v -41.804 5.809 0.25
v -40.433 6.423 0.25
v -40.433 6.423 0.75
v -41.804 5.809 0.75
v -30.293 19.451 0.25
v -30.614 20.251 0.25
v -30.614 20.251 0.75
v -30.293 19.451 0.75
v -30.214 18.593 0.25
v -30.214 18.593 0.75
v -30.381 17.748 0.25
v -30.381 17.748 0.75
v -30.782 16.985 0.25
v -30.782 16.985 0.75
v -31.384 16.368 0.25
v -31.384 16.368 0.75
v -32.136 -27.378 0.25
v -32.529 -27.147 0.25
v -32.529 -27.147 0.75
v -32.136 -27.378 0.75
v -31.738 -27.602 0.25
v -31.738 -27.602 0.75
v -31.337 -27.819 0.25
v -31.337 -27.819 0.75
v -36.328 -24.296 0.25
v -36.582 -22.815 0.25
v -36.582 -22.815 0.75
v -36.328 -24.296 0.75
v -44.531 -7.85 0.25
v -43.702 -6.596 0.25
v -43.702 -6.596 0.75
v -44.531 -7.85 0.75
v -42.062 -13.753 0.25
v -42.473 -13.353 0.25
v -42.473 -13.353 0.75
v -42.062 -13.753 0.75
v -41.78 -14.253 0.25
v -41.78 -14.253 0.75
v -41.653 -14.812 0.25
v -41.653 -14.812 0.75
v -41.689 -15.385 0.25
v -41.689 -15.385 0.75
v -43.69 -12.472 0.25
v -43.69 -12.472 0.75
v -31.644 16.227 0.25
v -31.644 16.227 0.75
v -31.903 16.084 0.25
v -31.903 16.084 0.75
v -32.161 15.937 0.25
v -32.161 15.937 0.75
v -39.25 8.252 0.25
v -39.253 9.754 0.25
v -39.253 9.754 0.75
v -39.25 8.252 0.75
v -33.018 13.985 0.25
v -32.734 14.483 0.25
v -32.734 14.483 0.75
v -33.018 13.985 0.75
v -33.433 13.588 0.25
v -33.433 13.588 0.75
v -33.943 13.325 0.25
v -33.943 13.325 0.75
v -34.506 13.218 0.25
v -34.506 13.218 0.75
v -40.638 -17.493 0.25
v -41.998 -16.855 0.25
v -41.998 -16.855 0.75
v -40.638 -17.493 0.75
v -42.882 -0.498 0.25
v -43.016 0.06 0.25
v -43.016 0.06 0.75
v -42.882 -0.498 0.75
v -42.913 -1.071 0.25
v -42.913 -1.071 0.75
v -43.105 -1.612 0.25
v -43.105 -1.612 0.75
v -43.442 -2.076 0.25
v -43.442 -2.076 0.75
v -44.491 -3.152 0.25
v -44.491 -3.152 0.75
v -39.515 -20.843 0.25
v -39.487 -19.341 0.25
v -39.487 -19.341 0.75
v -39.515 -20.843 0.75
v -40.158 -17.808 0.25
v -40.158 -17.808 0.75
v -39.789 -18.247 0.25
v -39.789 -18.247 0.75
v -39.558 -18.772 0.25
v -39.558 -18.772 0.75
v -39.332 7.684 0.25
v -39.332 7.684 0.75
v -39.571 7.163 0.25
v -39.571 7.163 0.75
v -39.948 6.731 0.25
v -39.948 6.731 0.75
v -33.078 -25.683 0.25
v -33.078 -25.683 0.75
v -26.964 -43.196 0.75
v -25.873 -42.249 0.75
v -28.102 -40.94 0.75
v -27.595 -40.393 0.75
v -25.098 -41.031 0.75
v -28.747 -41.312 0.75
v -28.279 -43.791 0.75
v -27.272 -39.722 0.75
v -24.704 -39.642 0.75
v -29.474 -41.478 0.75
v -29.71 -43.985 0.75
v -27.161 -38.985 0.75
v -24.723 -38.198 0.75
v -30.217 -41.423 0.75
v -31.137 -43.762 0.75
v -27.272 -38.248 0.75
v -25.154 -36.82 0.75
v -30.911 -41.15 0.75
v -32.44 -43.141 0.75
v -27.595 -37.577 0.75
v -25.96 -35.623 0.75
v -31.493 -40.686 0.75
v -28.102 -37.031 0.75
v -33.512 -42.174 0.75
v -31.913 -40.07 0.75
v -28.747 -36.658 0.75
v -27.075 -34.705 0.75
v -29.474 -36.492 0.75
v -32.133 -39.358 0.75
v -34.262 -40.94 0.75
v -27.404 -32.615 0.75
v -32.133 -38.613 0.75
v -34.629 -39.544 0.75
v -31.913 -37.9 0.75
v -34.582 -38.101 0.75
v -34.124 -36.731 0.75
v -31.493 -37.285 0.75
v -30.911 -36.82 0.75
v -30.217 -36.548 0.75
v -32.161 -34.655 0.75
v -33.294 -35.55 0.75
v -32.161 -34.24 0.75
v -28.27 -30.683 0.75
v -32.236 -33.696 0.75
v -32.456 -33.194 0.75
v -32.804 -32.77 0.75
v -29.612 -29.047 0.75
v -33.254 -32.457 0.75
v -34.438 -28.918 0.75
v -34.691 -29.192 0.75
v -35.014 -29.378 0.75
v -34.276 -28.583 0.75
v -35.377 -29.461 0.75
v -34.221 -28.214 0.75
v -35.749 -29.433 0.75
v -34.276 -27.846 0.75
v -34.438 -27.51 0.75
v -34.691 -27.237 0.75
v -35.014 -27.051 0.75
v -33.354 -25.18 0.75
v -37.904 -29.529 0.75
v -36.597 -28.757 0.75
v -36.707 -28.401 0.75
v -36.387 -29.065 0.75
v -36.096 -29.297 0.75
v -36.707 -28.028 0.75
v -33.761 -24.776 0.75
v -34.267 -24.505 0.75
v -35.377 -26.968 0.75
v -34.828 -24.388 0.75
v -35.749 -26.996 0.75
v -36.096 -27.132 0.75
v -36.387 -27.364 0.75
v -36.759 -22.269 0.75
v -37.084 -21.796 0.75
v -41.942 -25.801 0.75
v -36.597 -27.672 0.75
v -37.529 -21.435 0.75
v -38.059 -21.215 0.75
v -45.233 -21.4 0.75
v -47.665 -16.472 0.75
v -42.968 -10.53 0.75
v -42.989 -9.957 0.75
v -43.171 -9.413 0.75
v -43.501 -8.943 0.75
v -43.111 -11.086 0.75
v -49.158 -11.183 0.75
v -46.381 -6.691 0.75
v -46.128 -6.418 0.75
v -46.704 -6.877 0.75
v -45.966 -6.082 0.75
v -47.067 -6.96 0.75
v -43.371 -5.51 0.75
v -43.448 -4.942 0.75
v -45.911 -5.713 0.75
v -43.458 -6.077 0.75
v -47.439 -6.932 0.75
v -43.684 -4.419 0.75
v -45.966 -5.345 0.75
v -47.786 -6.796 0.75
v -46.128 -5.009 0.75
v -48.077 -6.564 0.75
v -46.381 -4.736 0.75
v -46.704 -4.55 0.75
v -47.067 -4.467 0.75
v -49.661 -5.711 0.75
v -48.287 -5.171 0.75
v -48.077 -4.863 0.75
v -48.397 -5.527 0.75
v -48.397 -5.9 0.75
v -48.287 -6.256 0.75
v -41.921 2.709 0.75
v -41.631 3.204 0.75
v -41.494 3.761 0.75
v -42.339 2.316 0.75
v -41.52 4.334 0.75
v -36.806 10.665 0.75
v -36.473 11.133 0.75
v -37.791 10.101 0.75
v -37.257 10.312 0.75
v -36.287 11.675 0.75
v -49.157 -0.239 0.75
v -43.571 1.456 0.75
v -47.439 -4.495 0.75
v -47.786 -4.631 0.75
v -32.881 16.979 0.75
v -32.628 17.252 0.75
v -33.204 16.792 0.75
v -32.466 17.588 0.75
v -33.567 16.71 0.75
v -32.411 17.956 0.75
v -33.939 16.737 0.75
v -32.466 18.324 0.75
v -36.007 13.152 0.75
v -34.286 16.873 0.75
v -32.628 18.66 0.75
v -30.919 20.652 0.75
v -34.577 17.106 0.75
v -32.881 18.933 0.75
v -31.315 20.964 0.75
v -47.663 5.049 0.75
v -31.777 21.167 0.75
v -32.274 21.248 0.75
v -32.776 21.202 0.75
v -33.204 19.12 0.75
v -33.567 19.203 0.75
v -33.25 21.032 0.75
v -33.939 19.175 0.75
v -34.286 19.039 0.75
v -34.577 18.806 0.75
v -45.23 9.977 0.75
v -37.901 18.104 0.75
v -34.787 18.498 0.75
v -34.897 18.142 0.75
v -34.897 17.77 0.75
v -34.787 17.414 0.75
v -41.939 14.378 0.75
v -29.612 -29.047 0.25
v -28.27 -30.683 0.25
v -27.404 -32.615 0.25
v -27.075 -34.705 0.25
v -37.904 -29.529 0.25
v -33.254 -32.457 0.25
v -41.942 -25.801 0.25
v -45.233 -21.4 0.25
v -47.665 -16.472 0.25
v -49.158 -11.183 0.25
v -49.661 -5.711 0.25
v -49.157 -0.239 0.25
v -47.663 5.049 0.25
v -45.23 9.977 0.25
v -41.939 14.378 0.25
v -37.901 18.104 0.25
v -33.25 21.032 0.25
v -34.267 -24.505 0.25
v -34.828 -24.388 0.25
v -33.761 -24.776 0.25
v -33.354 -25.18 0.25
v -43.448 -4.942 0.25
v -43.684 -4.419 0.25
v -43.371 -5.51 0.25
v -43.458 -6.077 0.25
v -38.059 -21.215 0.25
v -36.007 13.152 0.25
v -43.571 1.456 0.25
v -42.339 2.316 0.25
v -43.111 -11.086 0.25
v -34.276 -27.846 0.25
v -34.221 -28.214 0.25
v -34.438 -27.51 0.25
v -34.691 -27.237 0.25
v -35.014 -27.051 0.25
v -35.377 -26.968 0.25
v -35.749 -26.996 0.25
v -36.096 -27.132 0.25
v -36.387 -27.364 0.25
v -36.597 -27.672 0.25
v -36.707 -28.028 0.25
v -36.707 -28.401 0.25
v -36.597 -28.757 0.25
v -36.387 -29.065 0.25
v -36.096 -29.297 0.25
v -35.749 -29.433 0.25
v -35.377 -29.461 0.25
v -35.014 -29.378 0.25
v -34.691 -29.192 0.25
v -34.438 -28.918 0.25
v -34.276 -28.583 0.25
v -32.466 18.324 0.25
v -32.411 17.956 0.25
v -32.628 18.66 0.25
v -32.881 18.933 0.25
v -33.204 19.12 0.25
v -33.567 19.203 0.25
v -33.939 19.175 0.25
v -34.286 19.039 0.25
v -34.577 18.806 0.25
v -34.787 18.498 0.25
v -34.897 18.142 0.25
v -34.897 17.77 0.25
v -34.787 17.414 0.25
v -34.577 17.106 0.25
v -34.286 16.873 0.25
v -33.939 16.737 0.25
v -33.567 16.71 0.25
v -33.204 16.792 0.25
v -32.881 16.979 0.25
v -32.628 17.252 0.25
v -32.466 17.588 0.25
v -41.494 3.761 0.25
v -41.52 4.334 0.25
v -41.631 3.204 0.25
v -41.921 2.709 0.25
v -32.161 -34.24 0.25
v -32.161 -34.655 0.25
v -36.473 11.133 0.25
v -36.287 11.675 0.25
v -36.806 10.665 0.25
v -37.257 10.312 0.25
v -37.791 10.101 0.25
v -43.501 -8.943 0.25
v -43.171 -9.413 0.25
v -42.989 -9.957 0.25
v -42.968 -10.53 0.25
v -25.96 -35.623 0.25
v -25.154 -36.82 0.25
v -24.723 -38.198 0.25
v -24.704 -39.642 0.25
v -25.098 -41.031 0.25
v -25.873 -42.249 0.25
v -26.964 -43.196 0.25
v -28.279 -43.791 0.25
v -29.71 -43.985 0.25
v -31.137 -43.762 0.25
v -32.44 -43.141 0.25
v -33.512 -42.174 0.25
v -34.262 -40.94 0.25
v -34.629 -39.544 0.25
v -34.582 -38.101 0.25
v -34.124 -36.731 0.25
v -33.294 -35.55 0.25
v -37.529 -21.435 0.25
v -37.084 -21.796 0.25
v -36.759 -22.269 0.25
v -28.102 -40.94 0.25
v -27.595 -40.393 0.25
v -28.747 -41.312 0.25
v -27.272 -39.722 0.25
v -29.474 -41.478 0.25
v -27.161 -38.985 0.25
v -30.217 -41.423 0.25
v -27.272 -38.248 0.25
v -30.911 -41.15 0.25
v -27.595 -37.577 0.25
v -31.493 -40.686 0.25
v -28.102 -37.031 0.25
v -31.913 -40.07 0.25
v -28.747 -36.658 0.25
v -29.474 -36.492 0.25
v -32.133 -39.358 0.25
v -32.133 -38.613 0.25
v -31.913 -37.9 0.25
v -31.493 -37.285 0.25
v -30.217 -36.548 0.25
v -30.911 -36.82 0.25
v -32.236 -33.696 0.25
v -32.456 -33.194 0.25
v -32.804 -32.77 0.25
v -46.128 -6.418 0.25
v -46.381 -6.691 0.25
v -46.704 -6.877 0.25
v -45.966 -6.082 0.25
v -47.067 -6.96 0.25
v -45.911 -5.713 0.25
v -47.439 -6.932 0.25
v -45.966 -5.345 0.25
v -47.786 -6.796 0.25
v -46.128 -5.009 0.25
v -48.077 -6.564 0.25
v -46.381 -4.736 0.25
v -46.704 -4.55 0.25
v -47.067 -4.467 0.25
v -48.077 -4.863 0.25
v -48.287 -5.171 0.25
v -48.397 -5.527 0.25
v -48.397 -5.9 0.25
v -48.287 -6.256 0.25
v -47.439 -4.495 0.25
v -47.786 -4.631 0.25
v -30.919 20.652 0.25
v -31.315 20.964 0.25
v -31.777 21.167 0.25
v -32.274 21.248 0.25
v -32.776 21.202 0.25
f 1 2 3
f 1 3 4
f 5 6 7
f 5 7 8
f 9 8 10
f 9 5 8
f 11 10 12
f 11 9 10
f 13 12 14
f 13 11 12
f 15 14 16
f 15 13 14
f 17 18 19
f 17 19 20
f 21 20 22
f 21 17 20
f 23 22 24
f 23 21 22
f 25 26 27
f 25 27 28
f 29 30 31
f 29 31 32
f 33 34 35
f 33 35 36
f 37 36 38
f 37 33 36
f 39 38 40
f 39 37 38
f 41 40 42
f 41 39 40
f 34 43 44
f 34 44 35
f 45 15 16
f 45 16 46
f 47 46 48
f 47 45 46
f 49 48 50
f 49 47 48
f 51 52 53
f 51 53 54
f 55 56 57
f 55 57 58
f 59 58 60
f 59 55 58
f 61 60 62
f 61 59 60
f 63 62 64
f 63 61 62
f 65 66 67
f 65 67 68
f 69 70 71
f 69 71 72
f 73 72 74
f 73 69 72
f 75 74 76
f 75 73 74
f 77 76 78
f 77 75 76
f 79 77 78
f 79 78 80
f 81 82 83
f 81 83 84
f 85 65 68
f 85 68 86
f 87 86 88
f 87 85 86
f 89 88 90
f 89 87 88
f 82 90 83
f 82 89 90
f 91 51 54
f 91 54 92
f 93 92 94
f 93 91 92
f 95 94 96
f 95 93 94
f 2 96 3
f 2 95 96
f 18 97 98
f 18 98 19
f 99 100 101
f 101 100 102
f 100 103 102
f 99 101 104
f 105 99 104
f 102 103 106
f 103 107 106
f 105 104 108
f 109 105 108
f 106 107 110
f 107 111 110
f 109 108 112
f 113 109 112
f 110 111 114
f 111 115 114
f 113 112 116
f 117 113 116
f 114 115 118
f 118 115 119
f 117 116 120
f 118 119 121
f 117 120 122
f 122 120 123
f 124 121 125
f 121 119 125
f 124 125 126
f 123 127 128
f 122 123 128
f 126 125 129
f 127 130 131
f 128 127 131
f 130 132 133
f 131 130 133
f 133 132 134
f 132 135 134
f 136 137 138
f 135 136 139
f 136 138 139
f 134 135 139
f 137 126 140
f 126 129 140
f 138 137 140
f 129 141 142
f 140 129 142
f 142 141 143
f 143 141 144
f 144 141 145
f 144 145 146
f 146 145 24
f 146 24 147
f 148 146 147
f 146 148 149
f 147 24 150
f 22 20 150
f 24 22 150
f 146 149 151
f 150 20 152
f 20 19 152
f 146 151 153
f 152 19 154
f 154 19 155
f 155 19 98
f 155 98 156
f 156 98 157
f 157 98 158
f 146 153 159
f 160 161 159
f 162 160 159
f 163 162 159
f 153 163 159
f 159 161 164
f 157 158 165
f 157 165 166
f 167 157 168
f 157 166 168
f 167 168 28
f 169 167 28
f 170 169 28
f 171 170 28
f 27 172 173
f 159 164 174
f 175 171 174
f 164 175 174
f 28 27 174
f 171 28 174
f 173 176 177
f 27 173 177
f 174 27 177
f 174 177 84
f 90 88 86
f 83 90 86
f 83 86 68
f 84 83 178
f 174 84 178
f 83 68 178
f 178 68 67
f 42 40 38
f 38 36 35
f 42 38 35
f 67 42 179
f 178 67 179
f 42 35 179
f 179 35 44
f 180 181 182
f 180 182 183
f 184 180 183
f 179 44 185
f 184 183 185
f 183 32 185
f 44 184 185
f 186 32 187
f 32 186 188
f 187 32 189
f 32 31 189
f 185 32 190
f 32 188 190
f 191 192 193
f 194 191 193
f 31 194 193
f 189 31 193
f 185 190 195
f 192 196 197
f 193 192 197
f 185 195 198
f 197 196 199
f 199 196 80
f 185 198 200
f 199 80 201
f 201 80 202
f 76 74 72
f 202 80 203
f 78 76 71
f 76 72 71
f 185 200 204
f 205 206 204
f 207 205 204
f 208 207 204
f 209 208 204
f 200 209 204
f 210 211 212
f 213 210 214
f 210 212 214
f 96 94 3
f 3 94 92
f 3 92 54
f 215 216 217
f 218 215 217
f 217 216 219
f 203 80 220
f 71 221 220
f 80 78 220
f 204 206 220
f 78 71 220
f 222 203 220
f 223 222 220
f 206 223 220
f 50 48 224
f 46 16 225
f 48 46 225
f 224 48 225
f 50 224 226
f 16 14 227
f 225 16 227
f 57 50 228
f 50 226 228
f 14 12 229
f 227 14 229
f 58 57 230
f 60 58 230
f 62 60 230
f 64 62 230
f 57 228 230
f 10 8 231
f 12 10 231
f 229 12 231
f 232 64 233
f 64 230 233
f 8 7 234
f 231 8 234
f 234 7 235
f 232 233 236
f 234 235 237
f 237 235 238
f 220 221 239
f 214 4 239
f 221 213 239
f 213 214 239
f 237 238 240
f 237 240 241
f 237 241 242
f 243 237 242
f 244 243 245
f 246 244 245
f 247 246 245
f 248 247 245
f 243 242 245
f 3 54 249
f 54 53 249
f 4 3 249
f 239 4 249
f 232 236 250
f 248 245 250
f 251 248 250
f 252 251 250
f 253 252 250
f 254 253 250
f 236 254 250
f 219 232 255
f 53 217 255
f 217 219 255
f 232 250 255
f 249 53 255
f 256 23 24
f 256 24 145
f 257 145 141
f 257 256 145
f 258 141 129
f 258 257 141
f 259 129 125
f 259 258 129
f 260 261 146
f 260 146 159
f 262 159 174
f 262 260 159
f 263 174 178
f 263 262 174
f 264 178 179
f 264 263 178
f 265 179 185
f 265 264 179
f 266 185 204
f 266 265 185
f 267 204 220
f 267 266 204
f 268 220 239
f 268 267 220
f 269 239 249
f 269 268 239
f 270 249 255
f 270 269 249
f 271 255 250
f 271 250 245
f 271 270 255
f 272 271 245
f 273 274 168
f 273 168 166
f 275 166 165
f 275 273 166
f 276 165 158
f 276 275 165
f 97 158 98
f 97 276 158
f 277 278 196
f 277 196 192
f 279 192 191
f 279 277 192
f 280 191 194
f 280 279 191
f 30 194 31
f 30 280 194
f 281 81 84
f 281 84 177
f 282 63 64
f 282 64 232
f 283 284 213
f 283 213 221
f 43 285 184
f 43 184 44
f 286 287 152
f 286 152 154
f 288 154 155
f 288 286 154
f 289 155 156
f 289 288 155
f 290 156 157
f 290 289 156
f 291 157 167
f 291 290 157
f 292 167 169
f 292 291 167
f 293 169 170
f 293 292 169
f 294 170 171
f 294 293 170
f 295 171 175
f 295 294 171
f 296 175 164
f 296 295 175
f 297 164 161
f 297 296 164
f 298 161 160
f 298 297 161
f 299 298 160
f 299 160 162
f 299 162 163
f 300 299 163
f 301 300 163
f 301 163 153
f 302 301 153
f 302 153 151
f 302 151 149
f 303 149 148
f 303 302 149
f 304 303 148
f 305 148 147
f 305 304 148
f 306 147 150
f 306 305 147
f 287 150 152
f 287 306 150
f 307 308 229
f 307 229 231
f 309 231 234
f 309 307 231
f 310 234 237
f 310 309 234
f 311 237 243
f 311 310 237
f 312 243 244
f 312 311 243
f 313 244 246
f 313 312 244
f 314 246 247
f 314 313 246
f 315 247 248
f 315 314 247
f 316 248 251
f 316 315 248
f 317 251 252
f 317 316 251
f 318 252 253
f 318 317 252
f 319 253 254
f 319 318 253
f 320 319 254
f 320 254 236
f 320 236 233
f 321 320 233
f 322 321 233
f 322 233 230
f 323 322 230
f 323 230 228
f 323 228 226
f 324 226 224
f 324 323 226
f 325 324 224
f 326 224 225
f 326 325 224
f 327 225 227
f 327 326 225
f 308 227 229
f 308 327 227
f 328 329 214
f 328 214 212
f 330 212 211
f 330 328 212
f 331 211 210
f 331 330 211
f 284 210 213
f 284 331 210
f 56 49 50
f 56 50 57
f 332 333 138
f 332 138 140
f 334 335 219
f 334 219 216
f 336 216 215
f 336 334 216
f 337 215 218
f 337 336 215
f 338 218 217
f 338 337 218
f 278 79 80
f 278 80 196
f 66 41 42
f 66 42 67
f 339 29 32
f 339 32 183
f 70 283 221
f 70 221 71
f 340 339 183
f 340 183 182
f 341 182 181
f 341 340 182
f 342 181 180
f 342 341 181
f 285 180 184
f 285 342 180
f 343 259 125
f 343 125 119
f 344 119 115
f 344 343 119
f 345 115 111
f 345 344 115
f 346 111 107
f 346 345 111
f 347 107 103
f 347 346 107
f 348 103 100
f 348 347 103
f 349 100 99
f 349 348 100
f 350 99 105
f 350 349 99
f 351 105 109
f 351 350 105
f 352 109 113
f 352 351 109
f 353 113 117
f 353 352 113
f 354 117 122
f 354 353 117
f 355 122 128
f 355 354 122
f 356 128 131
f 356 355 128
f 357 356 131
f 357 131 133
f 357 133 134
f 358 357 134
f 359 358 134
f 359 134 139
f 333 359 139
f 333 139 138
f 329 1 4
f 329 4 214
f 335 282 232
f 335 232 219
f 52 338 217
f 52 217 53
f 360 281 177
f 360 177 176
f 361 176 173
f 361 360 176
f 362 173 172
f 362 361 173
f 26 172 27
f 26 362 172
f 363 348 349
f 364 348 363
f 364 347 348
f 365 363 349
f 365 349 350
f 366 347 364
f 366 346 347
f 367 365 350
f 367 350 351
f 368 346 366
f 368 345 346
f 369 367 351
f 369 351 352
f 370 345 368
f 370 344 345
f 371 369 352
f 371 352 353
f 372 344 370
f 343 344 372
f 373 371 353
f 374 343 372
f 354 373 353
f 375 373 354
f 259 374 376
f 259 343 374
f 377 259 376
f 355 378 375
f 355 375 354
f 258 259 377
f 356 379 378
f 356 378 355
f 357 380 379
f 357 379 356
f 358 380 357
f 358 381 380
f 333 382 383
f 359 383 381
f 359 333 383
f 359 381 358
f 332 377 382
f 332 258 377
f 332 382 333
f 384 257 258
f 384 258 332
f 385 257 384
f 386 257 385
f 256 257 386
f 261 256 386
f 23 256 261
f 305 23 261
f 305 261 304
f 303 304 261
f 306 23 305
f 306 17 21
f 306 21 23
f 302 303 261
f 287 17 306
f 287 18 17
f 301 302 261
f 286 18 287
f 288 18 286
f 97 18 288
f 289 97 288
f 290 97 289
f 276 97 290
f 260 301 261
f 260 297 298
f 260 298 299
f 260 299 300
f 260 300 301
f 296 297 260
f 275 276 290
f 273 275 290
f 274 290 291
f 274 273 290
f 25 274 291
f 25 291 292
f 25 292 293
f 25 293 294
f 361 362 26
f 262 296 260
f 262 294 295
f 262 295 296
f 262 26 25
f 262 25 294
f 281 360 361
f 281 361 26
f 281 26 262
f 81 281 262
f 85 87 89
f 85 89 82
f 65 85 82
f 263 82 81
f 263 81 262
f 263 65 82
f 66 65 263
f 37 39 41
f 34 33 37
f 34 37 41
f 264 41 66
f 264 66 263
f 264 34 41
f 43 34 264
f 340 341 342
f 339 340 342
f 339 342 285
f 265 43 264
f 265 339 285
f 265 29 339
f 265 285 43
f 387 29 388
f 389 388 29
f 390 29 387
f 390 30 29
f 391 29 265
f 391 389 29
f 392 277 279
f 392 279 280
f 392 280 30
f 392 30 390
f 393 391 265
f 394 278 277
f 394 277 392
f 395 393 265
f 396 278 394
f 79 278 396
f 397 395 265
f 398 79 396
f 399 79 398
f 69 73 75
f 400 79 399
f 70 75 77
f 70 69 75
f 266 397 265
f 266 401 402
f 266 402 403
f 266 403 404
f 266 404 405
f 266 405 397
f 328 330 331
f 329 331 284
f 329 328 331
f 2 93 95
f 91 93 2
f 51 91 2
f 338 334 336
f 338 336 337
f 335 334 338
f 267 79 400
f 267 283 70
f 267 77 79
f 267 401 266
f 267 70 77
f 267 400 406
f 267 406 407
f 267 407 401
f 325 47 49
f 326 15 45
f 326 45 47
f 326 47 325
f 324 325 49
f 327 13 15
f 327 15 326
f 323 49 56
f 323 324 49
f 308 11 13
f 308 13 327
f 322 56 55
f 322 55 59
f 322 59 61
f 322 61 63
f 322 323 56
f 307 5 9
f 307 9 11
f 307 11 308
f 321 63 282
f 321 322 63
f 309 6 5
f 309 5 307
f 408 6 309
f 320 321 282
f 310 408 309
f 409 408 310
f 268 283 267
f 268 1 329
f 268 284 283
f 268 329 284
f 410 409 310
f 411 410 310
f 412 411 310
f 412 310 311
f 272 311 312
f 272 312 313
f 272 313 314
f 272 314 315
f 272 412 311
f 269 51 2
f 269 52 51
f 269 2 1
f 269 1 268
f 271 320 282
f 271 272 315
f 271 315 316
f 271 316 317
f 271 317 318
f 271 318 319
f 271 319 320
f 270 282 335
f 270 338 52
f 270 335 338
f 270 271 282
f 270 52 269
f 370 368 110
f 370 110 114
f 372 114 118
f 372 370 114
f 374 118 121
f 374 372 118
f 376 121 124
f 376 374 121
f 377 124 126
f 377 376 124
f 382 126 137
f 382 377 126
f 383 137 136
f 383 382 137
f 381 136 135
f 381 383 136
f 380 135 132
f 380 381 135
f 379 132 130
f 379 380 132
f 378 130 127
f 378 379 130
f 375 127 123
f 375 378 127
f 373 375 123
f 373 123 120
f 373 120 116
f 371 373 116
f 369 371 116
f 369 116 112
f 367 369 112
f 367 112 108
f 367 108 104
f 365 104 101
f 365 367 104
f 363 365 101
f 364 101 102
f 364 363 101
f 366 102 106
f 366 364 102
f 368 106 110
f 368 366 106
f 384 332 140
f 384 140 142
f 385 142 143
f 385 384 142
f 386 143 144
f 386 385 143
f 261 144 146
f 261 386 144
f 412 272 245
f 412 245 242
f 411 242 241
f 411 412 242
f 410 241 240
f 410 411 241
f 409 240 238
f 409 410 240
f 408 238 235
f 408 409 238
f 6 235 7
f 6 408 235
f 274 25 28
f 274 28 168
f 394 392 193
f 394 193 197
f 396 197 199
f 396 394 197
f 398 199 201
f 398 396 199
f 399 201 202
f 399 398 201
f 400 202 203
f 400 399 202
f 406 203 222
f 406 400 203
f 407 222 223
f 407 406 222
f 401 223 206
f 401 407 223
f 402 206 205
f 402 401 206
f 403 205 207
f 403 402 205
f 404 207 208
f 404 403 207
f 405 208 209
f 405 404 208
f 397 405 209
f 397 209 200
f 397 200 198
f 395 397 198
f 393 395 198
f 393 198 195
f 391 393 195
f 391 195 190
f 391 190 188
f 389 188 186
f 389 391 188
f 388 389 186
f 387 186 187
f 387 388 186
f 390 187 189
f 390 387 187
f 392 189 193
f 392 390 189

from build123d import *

# Parameters (mm, degrees)
IZIM1_R                     = 5
IZIM1_R_2                   = 2.5
Y_KSEKLIK_EKSTR_ZYON2_DEPTH = 1
SCALE1_SCALE                = 0.5


with BuildPart() as part:
    # Çizim1 → Yükseklik-Ekstrüzyon2 (new body)
    with BuildSketch(Plane.XY):
        with BuildLine():
            Line((-25, 43.301270189), (-26.146521576, 40.39207739))
            ThreePointArc((-26.146521576, 40.39207739), (-27.544598222, 38.602623821), (-29.691484877, 37.862596744))
            Line((-29.691484877, 37.862596744), (-32.693673826, 37.730024144))
            Line((-32.693673826, 37.730024144), (-33.252115355, 34.777253066))
            ThreePointArc((-33.252115355, 34.777253066), (-34.290118058, 32.757522199), (-36.260310201, 31.628316593))
            Line((-36.260310201, 31.628316593), (-39.184480502, 30.935538106))
            Line((-39.184480502, 30.935538106), (-39.17973637, 27.930427214))
            ThreePointArc((-39.17973637, 27.930427214), (-39.820893366, 25.751969023), (-41.54459596, 24.273587558))
            Line((-41.54459596, 24.273587558), (-44.287157421, 23.045145208))
            Line((-44.287157421, 23.045145208), (-43.719395692, 20.094152054))
            ThreePointArc((-43.719395692, 20.094152054), (-43.940993675, 17.834139505), (-45.357143694, 16.058954583))
            Line((-45.357143694, 16.058954583), (-47.82093971, 14.338366552))
            Line((-47.82093971, 14.338366552), (-46.710273625, 11.546031539))
            ThreePointArc((-46.710273625, 11.546031539), (-46.504462376, 9.284526705), (-47.562892001, 7.275425136))
            Line((-47.562892001, 7.275425136), (-49.660641368, 5.123644113))
            Line((-49.660641368, 5.123644113), (-48.046416828, 2.588887101))
            ThreePointArc((-48.046416828, 2.588887101), (-47.420487313, 0.406004917), (-48.083701146, -1.765839874))
            Line((-48.083701146, -1.765839874), (-49.741090048, -4.272585973))
            Line((-49.741090048, -4.272585973), (-47.680491761, -6.459969953))
            ThreePointArc((-47.680491761, -6.459969953), (-46.656617846, -8.486899797), (-46.901121207, -10.744549126))
            Line((-46.901121207, -10.744549126), (-48.059435816, -13.517457571))
            Line((-48.059435816, -13.517457571), (-45.625461503, -15.279979352))
            ThreePointArc((-45.625461503, -15.279979352), (-44.239914432, -17.079151855), (-44.057045667, -19.342627369))
            Line((-44.057045667, -19.342627369), (-44.675252109, -22.283466496))
            Line((-44.675252109, -22.283466496), (-41.954126526, -23.558687864))
            ThreePointArc((-41.954126526, -23.558687864), (-40.255989993, -25.066366444), (-39.652227319, -27.255483394))
            Line((-39.652227319, -27.255483394), (-39.708425324, -30.260072511))
            Line((-39.708425324, -30.260072511), (-36.7965457, -31.002818113))
            ThreePointArc((-36.7965457, -31.002818113), (-34.84597704, -32.165592505), (-33.842709051, -34.202800331))
            Line((-33.842709051, -34.202800331), (-33.334907776, -37.164700371))
            Line((-33.334907776, -37.164700371), (-30.335428898, -37.348658075))
            ThreePointArc((-30.335428898, -37.348658075), (-28.201527977, -38.125336415), (-26.834295942, -39.938466016))
            Line((-26.834295942, -39.938466016), (-25.73775467, -42.866863479))
            ThreePointArc((-25.73775467, -42.866863479), (-24.554196145, -43.55561332), (-23.352220135, -44.21169319))
            ThreePointArc((-23.352220135, -44.21169319), (-17.219408632, -49.939828574), (-14.829333353, -57.984109281))
            ThreePointArc((-14.829333353, -57.984109281), (-20.099106379, -76.543069457), (-25, -57.883306535))
            Line((-25, -57.883306535), (-25, -57.052607302))
            ThreePointArc((-25, -57.052607302), (-25.590454576, -54.960957236), (-27.1875, -53.486819346))
            ThreePointArc((-27.1875, -53.486819346), (-59.999999835, 0.004450967), (-27.179564099, 53.490852446))
            ThreePointArc((-27.179564099, 53.490852446), (-24.232021318, 53.76021953), (-21.906244367, 51.929556087))
            ThreePointArc((-21.906244367, 51.929556087), (-21.212806241, 47.755648425), (-23.446136356, 44.161959762))
            ThreePointArc((-23.446136356, 44.161959762), (-24.226890609, 43.73851588), (-25, 43.301270189))
        make_face()
        with Locations((-20, -66.543560573)):
            Circle(IZIM1_R, mode=Mode.SUBTRACT)
        with Locations((-31.620079453, -45.001895242)):
            Circle(IZIM1_R_2, mode=Mode.SUBTRACT)
        with Locations((-55, 0)):
            Circle(IZIM1_R_2, mode=Mode.SUBTRACT)
        with Locations((-28.000624989, 47.338831842)):
            Circle(IZIM1_R_2, mode=Mode.SUBTRACT)
    extrude(amount=Y_KSEKLIK_EKSTR_ZYON2_DEPTH)


with BuildPart() as part_1:
    # Scale1: scaled about (-39.321045235, -11.426802876, 0.5)
    add(part.part.scale(SCALE1_SCALE).moved(Location((-19.660522617, -5.713401438, 0.25))))


solid = part_1.part
